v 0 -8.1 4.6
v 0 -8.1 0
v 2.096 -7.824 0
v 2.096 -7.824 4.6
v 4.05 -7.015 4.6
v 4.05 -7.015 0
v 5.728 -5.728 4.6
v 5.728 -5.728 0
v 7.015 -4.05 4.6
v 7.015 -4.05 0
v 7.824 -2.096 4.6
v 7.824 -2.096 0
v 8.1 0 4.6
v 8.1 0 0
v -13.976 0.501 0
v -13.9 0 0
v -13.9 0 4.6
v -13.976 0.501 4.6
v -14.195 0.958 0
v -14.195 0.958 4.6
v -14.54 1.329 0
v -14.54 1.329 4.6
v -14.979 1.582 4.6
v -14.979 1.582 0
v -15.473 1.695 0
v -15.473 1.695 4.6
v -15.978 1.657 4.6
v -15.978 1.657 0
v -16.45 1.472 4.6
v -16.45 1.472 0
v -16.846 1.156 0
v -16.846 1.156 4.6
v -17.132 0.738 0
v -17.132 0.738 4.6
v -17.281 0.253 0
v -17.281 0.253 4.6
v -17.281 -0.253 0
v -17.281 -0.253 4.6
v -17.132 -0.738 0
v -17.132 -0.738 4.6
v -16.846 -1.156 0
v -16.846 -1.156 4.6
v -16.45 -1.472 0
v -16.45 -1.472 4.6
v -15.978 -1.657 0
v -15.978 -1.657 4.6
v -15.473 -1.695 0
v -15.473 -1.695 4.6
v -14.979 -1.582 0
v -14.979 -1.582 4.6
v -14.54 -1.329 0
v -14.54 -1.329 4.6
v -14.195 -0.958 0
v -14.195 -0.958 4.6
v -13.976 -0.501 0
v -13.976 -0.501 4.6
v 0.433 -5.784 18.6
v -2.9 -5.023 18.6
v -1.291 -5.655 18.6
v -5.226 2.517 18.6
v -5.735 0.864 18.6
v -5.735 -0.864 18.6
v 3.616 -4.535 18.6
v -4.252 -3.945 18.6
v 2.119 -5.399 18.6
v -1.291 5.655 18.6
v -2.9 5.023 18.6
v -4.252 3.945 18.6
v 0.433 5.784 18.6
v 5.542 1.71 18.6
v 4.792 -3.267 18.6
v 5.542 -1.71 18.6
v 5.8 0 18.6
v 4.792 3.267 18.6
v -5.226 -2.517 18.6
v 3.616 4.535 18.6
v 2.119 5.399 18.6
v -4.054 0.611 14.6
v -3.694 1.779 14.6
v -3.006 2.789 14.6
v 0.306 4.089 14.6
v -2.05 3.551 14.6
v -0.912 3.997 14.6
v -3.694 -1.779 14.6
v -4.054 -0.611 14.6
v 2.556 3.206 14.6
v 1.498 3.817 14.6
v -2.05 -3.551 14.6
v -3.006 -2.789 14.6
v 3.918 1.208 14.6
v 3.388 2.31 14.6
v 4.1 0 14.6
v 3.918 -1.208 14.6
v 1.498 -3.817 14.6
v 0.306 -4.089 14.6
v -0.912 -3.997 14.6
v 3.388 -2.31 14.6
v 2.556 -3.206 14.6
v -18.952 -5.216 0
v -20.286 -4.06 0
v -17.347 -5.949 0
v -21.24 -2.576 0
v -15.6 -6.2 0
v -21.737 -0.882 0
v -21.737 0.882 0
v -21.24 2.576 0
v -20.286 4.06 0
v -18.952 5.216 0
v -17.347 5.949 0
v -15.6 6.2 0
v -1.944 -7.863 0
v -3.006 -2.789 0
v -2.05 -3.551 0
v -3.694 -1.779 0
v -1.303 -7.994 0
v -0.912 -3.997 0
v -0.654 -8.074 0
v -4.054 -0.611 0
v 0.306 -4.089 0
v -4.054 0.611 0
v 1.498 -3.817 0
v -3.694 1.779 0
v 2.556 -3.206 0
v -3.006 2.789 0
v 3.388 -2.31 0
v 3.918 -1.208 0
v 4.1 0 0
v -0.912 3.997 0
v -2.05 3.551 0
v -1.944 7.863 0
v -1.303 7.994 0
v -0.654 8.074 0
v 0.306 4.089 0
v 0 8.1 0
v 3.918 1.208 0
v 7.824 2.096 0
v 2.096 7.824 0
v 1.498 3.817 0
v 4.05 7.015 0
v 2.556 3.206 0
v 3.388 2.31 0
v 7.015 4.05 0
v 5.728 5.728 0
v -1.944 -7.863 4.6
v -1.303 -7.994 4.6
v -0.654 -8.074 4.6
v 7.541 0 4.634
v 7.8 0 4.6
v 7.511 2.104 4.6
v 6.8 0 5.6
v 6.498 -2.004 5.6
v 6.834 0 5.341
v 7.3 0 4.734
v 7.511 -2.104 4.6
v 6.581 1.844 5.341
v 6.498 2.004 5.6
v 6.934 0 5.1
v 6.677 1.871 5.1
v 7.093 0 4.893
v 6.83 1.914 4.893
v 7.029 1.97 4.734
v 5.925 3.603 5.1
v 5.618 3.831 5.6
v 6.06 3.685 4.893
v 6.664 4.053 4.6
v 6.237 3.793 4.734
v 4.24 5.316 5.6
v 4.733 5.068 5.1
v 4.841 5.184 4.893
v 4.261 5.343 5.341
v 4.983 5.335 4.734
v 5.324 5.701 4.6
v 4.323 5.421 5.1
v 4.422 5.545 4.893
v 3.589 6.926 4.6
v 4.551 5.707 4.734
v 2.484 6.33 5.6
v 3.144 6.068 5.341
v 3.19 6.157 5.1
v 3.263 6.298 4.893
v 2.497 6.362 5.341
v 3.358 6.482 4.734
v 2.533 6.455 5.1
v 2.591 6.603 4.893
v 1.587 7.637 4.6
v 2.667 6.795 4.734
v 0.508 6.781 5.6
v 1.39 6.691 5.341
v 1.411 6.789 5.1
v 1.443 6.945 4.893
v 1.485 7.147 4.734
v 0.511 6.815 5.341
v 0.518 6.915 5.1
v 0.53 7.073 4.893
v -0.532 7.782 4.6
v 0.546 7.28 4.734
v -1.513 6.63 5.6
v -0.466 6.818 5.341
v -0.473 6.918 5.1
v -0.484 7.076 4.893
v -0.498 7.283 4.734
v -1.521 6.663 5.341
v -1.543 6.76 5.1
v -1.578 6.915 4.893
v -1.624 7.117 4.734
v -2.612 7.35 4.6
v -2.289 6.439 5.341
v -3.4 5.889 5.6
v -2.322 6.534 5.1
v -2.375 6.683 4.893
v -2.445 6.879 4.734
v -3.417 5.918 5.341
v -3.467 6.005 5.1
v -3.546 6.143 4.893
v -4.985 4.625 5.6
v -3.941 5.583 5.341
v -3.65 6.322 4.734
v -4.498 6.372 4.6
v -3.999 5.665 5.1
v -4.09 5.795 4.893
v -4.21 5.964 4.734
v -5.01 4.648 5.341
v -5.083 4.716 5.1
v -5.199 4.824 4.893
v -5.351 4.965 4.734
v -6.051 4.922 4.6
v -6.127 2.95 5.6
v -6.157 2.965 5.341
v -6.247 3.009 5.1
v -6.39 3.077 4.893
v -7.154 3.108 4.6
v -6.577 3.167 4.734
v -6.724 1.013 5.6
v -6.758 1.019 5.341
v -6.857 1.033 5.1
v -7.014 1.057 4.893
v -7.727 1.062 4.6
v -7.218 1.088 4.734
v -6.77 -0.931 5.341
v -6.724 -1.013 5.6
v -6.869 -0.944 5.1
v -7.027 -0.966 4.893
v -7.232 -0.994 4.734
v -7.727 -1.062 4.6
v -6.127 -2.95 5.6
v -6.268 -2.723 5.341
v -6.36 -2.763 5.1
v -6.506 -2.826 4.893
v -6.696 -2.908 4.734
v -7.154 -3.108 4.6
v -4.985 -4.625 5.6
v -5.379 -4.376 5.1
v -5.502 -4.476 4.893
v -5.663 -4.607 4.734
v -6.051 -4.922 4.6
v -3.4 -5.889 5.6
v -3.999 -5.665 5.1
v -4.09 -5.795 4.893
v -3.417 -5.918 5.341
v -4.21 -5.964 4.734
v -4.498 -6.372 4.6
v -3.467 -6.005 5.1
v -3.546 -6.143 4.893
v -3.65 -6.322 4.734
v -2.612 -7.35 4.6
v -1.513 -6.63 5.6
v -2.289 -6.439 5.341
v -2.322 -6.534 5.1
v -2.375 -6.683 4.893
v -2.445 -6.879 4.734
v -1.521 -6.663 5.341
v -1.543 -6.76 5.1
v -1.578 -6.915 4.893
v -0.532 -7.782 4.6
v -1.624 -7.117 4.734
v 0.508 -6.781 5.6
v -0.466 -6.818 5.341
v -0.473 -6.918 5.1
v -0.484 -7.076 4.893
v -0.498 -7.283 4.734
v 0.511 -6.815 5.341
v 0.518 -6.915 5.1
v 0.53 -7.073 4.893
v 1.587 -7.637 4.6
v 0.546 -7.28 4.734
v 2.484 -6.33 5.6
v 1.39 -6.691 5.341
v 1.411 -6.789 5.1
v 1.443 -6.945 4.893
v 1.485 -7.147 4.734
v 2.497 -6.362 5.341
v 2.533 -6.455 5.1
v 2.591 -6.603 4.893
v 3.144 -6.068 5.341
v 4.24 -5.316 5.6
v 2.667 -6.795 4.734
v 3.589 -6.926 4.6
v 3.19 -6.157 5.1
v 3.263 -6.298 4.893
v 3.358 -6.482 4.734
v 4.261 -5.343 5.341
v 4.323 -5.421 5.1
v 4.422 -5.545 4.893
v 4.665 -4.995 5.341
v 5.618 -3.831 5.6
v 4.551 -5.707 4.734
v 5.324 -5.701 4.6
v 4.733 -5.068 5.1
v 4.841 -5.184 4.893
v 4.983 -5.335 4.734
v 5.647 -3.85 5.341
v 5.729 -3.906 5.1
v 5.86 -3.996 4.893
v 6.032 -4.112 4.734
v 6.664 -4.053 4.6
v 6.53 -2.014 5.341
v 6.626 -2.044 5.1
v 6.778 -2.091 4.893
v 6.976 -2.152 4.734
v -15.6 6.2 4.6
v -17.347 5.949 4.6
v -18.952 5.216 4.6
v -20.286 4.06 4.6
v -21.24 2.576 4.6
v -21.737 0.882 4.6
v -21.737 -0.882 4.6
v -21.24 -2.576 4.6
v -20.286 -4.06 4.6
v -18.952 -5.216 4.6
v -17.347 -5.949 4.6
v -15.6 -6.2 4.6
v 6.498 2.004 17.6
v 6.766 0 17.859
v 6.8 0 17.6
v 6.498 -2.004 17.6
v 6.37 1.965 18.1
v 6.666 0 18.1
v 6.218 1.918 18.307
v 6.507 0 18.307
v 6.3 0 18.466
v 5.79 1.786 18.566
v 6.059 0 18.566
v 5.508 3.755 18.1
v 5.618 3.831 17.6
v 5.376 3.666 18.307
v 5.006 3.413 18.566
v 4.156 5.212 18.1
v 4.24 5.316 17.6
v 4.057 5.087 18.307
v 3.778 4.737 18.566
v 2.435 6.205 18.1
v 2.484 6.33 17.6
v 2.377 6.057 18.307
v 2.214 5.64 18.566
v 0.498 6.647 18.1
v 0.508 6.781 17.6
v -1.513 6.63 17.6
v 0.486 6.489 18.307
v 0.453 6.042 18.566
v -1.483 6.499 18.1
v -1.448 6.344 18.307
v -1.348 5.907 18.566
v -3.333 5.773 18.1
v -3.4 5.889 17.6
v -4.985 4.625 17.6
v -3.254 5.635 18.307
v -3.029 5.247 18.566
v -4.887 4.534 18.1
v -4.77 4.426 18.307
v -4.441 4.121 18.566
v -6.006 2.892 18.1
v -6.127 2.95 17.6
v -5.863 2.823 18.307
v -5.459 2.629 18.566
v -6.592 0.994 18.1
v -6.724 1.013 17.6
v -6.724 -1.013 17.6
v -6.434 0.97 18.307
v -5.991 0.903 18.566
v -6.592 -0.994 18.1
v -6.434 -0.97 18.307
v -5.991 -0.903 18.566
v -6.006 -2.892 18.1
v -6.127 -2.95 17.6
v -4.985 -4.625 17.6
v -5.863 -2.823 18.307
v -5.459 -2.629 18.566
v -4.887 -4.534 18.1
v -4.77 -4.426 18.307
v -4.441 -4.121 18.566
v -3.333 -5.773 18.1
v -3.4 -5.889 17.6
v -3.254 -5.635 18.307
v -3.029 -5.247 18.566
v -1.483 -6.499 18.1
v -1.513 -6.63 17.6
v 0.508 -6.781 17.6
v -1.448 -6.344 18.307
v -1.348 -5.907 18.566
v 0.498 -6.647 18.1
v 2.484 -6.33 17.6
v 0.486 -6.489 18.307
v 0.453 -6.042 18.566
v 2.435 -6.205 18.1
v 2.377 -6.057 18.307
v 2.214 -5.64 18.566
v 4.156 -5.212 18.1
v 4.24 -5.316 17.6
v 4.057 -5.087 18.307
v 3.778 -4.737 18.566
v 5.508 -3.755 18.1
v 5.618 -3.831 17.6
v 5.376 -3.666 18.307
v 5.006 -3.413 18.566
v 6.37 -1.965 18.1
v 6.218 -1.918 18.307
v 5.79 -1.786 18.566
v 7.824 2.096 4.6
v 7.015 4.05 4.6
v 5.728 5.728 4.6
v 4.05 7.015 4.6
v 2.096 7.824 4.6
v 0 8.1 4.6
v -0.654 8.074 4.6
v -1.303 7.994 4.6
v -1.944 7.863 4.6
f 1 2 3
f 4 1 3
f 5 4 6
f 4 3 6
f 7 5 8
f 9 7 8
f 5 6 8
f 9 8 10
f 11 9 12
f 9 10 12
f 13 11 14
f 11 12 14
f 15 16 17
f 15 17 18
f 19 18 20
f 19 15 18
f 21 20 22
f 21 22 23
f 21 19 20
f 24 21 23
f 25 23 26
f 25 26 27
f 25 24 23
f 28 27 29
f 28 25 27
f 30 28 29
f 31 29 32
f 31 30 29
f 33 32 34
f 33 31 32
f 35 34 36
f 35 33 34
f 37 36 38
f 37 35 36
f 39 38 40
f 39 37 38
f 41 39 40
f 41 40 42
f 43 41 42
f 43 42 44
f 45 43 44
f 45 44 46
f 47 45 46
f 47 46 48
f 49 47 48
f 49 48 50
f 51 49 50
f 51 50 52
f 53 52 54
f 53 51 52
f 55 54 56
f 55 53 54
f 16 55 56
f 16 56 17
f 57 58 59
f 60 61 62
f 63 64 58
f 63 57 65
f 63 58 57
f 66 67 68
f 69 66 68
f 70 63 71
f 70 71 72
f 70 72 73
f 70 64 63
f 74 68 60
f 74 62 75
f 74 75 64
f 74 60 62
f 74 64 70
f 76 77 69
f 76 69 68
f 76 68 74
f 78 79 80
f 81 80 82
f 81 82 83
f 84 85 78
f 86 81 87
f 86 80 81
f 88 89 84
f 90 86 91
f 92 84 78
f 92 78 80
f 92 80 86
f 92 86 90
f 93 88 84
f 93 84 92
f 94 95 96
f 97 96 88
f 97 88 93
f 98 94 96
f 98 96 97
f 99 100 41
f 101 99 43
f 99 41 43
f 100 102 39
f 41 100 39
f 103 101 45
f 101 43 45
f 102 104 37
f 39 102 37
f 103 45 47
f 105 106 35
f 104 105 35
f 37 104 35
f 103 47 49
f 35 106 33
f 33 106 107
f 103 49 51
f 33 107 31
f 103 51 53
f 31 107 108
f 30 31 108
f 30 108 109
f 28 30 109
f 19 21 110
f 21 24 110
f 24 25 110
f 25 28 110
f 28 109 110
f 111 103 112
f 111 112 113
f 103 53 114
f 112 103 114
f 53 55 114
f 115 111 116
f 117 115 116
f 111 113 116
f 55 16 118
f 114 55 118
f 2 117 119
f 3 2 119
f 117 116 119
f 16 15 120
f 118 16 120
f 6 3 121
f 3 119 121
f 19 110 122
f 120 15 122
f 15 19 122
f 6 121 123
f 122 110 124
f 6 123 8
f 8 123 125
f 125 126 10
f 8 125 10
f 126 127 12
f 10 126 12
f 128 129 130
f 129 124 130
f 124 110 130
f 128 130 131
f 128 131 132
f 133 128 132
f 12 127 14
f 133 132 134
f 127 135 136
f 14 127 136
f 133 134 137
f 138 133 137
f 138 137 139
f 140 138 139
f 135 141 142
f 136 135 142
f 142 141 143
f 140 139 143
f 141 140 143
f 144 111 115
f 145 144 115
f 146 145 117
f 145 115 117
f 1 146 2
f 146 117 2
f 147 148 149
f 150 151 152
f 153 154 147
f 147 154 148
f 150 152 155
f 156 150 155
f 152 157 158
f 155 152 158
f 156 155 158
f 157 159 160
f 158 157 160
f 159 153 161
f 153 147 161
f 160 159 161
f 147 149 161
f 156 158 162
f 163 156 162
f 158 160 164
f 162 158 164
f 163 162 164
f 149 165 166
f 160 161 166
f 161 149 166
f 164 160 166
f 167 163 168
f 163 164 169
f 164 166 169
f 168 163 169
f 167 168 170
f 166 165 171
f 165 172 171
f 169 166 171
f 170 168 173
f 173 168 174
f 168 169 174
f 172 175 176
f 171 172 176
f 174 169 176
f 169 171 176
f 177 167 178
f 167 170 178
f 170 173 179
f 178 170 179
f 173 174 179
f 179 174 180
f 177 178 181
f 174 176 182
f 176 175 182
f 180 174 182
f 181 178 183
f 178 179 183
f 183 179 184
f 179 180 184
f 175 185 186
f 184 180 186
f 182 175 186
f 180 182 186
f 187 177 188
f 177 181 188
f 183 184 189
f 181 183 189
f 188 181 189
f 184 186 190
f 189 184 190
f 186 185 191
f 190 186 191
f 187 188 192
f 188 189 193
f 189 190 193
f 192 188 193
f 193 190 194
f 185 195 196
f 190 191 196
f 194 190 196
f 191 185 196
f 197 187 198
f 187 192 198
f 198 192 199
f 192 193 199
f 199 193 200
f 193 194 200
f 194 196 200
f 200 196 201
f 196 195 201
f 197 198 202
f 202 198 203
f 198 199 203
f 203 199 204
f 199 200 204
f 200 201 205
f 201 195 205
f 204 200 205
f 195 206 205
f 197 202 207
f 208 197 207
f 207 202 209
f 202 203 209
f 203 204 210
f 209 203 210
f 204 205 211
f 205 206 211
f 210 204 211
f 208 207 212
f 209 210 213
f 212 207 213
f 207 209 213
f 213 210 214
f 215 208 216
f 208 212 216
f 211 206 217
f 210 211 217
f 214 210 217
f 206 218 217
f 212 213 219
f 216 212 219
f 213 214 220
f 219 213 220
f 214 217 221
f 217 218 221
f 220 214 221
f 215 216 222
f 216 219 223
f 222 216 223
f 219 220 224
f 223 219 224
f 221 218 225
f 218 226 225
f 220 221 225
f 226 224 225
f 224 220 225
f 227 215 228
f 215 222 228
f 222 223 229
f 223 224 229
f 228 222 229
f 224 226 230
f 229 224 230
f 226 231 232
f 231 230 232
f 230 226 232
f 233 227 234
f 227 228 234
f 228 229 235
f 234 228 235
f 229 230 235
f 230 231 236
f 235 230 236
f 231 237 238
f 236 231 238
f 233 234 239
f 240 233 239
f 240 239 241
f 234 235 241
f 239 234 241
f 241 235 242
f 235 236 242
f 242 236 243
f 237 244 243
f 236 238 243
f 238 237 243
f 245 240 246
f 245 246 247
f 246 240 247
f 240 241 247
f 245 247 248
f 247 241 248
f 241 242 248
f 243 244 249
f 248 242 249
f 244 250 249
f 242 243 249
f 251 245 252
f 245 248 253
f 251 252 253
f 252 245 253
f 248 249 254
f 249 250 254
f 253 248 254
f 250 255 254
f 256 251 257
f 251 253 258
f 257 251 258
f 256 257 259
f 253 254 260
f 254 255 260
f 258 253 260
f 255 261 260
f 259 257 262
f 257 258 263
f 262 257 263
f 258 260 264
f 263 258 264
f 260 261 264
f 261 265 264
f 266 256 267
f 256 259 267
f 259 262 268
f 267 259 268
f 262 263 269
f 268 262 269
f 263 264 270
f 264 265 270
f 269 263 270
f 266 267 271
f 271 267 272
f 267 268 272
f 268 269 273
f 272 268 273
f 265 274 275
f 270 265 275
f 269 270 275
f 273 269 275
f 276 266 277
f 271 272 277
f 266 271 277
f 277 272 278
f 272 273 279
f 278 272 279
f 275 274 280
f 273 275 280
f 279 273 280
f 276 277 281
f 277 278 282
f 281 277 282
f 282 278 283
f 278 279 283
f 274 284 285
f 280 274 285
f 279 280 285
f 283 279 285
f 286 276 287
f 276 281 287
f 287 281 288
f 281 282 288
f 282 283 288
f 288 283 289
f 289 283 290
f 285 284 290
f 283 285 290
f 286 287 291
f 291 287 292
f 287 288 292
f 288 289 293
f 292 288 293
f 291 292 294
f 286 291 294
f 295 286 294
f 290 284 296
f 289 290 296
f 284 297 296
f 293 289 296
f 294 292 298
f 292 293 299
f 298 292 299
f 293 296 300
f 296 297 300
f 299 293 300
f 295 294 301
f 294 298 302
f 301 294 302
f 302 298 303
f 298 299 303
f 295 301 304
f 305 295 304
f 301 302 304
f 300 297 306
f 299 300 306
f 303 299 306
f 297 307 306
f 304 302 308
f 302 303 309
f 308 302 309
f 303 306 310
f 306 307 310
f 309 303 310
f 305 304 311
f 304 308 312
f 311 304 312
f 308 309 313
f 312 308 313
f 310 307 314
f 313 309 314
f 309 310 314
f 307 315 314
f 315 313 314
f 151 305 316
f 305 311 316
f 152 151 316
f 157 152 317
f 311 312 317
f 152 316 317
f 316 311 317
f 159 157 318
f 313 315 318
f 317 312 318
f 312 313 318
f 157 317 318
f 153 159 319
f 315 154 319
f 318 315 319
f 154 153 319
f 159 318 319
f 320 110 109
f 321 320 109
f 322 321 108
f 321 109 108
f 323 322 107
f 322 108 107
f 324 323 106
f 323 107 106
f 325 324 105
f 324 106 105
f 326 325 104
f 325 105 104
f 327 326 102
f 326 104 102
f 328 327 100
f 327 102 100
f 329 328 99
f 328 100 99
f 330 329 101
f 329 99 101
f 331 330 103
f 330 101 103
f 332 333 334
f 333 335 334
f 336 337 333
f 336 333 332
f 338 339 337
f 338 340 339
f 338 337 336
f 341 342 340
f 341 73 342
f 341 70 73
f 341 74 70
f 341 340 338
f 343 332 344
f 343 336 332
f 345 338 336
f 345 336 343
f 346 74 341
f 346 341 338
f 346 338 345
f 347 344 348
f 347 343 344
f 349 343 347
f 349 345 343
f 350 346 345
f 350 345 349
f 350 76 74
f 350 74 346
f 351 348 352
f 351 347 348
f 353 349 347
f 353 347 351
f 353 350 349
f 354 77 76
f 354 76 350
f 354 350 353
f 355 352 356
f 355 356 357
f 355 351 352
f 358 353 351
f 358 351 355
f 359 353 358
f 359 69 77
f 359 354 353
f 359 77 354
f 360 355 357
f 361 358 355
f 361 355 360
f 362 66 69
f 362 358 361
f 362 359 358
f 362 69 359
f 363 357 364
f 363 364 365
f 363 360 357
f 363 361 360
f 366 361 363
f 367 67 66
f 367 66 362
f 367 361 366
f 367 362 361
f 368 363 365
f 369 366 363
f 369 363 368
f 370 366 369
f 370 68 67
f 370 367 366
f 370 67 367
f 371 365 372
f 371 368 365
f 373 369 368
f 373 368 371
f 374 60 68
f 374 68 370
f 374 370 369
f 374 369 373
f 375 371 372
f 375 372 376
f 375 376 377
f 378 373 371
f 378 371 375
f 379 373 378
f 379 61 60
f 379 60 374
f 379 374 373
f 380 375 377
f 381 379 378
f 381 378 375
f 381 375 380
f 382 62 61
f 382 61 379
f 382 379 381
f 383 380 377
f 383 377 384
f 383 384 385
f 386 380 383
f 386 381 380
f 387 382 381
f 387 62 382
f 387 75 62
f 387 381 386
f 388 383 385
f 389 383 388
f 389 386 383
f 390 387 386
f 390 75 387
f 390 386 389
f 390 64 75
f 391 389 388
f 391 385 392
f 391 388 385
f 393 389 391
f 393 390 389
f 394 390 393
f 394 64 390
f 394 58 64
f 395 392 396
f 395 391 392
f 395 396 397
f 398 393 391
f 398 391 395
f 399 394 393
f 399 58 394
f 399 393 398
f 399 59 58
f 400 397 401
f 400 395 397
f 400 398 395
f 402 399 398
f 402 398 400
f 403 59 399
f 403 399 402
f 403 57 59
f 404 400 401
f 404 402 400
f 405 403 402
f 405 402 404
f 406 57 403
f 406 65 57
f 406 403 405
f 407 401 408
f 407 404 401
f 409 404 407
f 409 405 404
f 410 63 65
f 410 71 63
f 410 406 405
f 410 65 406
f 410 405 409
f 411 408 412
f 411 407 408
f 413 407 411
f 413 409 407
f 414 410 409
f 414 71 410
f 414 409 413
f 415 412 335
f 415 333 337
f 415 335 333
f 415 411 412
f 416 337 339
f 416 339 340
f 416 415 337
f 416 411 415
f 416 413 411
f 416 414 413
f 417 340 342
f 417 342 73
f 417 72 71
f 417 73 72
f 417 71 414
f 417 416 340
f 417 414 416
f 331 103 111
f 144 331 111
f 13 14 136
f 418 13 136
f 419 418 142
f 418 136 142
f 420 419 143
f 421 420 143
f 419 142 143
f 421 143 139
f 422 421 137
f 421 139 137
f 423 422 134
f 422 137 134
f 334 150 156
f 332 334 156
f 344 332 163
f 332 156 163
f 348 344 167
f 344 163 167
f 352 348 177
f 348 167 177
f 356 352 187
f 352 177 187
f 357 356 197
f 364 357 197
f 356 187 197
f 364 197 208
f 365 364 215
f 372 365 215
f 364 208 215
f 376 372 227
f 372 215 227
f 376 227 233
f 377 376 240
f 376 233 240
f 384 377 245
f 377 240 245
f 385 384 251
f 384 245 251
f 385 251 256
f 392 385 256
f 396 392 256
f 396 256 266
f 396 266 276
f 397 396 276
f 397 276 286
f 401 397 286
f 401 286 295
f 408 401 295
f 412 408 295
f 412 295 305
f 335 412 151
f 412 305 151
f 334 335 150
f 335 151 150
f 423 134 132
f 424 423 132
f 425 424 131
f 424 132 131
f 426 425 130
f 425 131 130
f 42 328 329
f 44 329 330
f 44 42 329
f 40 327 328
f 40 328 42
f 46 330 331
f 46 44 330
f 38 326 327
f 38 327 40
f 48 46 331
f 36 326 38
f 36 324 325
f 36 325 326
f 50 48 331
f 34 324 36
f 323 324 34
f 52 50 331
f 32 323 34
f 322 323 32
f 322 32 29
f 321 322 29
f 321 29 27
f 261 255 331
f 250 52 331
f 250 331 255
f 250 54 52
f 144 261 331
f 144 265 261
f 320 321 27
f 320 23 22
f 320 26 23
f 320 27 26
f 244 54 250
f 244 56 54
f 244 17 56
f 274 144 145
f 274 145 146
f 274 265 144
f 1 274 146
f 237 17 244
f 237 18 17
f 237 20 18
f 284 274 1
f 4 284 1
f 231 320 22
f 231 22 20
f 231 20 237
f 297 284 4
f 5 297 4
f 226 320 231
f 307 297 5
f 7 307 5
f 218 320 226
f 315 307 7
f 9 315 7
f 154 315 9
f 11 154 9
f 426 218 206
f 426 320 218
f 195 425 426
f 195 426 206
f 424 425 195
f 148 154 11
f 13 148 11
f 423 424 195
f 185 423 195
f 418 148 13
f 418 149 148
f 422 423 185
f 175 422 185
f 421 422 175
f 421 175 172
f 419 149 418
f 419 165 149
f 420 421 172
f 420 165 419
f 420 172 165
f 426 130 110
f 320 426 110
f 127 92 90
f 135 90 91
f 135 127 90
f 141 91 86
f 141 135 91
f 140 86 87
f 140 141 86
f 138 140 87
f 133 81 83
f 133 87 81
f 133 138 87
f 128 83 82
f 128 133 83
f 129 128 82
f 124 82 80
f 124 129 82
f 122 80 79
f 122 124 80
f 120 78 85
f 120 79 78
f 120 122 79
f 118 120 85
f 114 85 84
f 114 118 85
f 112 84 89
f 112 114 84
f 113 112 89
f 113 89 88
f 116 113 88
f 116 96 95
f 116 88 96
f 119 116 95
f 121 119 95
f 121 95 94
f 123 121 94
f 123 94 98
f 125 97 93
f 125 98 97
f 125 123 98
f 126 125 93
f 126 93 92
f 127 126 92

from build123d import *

# Parameters (mm, degrees)
F0_R      = 1.7
F0_R_2    = 4.1
F1_DEPTH  = 4.6
F2_R      = 6.8
F3_DEPTH  = 14
F3_FACE_R = 4.1
F4_DEPTH  = 10
F5_R      = 1


with BuildPart() as f1:
    # F0 (on Top) → F1 (new body)
    with BuildSketch(Plane.XY):
        with BuildLine():
            ThreePointArc((-15.6, -6.2), (-11.215938, -4.384062), (-9.4, 0))
            ThreePointArc((-9.4, 0), (-11.215938, 4.384062), (-15.6, 6.2))
            ThreePointArc((-15.6, 6.2), (-21.8, 0), (-15.6, -6.2))
        make_face()
        with Locations((-15.6, 0)):
            Circle(F0_R, mode=Mode.SUBTRACT)
        with BuildLine():
            ThreePointArc((-15.6, 6.2), (-11.215938, 4.384062), (-9.4, 0))
            ThreePointArc((-9.4, 0), (-11.215938, -4.384062), (-15.6, -6.2))
            Line((-15.6, -6.2), (-1.944236, -7.863202))
            ThreePointArc((-1.944236, -7.863202), (-8.1, 0), (-1.944236, 7.863202))
            Line((-1.944236, 7.863202), (-15.6, 6.2))
        make_face()
        with BuildLine():
            Line((0, 8.1), (-1.944236, 7.863202))
            ThreePointArc((-1.944236, 7.863202), (-8.1, 0), (-1.944236, -7.863202))
            Line((-1.944236, -7.863202), (0, -8.1))
            ThreePointArc((0, -8.1), (5.727565, -5.727565), (8.1, 0))
            ThreePointArc((8.1, 0), (5.727565, 5.727565), (0, 8.1))
        make_face()
        Circle(F0_R_2, mode=Mode.SUBTRACT)
        with BuildLine():
            ThreePointArc((0, 8.1), (-0.979302, 8.040583), (-1.944236, 7.863202))
            Line((-1.944236, 7.863202), (0, 8.1))
        make_face()
        with BuildLine():
            Line((0, -8.1), (-1.944236, -7.863202))
            ThreePointArc((-1.944236, -7.863202), (-0.979302, -8.040583), (0, -8.1))
        make_face()
    extrude(amount=F1_DEPTH)

    # F2 (on face) → F3 (join)
    with BuildSketch(Plane.XY.offset(4.6)):
        Circle(F2_R)
    extrude(amount=F3_DEPTH)

    # F3_face (on face) → F4 (cut)
    with BuildSketch(Plane(origin=(0, 0, 4.6), x_dir=(1, 0, 0), z_dir=(0, 0, -1))):
        Circle(F3_FACE_R)
    extrude(amount=-F4_DEPTH, mode=Mode.SUBTRACT)

    # F5
    f5_edges = [f1.edges().sort_by_distance(p)[0] for p in [
        (-6.8, 0, 4.6),
        (-6.8, 0, 18.6),
    ]]
    fillet(f5_edges, radius=F5_R)


solid = f1.part
